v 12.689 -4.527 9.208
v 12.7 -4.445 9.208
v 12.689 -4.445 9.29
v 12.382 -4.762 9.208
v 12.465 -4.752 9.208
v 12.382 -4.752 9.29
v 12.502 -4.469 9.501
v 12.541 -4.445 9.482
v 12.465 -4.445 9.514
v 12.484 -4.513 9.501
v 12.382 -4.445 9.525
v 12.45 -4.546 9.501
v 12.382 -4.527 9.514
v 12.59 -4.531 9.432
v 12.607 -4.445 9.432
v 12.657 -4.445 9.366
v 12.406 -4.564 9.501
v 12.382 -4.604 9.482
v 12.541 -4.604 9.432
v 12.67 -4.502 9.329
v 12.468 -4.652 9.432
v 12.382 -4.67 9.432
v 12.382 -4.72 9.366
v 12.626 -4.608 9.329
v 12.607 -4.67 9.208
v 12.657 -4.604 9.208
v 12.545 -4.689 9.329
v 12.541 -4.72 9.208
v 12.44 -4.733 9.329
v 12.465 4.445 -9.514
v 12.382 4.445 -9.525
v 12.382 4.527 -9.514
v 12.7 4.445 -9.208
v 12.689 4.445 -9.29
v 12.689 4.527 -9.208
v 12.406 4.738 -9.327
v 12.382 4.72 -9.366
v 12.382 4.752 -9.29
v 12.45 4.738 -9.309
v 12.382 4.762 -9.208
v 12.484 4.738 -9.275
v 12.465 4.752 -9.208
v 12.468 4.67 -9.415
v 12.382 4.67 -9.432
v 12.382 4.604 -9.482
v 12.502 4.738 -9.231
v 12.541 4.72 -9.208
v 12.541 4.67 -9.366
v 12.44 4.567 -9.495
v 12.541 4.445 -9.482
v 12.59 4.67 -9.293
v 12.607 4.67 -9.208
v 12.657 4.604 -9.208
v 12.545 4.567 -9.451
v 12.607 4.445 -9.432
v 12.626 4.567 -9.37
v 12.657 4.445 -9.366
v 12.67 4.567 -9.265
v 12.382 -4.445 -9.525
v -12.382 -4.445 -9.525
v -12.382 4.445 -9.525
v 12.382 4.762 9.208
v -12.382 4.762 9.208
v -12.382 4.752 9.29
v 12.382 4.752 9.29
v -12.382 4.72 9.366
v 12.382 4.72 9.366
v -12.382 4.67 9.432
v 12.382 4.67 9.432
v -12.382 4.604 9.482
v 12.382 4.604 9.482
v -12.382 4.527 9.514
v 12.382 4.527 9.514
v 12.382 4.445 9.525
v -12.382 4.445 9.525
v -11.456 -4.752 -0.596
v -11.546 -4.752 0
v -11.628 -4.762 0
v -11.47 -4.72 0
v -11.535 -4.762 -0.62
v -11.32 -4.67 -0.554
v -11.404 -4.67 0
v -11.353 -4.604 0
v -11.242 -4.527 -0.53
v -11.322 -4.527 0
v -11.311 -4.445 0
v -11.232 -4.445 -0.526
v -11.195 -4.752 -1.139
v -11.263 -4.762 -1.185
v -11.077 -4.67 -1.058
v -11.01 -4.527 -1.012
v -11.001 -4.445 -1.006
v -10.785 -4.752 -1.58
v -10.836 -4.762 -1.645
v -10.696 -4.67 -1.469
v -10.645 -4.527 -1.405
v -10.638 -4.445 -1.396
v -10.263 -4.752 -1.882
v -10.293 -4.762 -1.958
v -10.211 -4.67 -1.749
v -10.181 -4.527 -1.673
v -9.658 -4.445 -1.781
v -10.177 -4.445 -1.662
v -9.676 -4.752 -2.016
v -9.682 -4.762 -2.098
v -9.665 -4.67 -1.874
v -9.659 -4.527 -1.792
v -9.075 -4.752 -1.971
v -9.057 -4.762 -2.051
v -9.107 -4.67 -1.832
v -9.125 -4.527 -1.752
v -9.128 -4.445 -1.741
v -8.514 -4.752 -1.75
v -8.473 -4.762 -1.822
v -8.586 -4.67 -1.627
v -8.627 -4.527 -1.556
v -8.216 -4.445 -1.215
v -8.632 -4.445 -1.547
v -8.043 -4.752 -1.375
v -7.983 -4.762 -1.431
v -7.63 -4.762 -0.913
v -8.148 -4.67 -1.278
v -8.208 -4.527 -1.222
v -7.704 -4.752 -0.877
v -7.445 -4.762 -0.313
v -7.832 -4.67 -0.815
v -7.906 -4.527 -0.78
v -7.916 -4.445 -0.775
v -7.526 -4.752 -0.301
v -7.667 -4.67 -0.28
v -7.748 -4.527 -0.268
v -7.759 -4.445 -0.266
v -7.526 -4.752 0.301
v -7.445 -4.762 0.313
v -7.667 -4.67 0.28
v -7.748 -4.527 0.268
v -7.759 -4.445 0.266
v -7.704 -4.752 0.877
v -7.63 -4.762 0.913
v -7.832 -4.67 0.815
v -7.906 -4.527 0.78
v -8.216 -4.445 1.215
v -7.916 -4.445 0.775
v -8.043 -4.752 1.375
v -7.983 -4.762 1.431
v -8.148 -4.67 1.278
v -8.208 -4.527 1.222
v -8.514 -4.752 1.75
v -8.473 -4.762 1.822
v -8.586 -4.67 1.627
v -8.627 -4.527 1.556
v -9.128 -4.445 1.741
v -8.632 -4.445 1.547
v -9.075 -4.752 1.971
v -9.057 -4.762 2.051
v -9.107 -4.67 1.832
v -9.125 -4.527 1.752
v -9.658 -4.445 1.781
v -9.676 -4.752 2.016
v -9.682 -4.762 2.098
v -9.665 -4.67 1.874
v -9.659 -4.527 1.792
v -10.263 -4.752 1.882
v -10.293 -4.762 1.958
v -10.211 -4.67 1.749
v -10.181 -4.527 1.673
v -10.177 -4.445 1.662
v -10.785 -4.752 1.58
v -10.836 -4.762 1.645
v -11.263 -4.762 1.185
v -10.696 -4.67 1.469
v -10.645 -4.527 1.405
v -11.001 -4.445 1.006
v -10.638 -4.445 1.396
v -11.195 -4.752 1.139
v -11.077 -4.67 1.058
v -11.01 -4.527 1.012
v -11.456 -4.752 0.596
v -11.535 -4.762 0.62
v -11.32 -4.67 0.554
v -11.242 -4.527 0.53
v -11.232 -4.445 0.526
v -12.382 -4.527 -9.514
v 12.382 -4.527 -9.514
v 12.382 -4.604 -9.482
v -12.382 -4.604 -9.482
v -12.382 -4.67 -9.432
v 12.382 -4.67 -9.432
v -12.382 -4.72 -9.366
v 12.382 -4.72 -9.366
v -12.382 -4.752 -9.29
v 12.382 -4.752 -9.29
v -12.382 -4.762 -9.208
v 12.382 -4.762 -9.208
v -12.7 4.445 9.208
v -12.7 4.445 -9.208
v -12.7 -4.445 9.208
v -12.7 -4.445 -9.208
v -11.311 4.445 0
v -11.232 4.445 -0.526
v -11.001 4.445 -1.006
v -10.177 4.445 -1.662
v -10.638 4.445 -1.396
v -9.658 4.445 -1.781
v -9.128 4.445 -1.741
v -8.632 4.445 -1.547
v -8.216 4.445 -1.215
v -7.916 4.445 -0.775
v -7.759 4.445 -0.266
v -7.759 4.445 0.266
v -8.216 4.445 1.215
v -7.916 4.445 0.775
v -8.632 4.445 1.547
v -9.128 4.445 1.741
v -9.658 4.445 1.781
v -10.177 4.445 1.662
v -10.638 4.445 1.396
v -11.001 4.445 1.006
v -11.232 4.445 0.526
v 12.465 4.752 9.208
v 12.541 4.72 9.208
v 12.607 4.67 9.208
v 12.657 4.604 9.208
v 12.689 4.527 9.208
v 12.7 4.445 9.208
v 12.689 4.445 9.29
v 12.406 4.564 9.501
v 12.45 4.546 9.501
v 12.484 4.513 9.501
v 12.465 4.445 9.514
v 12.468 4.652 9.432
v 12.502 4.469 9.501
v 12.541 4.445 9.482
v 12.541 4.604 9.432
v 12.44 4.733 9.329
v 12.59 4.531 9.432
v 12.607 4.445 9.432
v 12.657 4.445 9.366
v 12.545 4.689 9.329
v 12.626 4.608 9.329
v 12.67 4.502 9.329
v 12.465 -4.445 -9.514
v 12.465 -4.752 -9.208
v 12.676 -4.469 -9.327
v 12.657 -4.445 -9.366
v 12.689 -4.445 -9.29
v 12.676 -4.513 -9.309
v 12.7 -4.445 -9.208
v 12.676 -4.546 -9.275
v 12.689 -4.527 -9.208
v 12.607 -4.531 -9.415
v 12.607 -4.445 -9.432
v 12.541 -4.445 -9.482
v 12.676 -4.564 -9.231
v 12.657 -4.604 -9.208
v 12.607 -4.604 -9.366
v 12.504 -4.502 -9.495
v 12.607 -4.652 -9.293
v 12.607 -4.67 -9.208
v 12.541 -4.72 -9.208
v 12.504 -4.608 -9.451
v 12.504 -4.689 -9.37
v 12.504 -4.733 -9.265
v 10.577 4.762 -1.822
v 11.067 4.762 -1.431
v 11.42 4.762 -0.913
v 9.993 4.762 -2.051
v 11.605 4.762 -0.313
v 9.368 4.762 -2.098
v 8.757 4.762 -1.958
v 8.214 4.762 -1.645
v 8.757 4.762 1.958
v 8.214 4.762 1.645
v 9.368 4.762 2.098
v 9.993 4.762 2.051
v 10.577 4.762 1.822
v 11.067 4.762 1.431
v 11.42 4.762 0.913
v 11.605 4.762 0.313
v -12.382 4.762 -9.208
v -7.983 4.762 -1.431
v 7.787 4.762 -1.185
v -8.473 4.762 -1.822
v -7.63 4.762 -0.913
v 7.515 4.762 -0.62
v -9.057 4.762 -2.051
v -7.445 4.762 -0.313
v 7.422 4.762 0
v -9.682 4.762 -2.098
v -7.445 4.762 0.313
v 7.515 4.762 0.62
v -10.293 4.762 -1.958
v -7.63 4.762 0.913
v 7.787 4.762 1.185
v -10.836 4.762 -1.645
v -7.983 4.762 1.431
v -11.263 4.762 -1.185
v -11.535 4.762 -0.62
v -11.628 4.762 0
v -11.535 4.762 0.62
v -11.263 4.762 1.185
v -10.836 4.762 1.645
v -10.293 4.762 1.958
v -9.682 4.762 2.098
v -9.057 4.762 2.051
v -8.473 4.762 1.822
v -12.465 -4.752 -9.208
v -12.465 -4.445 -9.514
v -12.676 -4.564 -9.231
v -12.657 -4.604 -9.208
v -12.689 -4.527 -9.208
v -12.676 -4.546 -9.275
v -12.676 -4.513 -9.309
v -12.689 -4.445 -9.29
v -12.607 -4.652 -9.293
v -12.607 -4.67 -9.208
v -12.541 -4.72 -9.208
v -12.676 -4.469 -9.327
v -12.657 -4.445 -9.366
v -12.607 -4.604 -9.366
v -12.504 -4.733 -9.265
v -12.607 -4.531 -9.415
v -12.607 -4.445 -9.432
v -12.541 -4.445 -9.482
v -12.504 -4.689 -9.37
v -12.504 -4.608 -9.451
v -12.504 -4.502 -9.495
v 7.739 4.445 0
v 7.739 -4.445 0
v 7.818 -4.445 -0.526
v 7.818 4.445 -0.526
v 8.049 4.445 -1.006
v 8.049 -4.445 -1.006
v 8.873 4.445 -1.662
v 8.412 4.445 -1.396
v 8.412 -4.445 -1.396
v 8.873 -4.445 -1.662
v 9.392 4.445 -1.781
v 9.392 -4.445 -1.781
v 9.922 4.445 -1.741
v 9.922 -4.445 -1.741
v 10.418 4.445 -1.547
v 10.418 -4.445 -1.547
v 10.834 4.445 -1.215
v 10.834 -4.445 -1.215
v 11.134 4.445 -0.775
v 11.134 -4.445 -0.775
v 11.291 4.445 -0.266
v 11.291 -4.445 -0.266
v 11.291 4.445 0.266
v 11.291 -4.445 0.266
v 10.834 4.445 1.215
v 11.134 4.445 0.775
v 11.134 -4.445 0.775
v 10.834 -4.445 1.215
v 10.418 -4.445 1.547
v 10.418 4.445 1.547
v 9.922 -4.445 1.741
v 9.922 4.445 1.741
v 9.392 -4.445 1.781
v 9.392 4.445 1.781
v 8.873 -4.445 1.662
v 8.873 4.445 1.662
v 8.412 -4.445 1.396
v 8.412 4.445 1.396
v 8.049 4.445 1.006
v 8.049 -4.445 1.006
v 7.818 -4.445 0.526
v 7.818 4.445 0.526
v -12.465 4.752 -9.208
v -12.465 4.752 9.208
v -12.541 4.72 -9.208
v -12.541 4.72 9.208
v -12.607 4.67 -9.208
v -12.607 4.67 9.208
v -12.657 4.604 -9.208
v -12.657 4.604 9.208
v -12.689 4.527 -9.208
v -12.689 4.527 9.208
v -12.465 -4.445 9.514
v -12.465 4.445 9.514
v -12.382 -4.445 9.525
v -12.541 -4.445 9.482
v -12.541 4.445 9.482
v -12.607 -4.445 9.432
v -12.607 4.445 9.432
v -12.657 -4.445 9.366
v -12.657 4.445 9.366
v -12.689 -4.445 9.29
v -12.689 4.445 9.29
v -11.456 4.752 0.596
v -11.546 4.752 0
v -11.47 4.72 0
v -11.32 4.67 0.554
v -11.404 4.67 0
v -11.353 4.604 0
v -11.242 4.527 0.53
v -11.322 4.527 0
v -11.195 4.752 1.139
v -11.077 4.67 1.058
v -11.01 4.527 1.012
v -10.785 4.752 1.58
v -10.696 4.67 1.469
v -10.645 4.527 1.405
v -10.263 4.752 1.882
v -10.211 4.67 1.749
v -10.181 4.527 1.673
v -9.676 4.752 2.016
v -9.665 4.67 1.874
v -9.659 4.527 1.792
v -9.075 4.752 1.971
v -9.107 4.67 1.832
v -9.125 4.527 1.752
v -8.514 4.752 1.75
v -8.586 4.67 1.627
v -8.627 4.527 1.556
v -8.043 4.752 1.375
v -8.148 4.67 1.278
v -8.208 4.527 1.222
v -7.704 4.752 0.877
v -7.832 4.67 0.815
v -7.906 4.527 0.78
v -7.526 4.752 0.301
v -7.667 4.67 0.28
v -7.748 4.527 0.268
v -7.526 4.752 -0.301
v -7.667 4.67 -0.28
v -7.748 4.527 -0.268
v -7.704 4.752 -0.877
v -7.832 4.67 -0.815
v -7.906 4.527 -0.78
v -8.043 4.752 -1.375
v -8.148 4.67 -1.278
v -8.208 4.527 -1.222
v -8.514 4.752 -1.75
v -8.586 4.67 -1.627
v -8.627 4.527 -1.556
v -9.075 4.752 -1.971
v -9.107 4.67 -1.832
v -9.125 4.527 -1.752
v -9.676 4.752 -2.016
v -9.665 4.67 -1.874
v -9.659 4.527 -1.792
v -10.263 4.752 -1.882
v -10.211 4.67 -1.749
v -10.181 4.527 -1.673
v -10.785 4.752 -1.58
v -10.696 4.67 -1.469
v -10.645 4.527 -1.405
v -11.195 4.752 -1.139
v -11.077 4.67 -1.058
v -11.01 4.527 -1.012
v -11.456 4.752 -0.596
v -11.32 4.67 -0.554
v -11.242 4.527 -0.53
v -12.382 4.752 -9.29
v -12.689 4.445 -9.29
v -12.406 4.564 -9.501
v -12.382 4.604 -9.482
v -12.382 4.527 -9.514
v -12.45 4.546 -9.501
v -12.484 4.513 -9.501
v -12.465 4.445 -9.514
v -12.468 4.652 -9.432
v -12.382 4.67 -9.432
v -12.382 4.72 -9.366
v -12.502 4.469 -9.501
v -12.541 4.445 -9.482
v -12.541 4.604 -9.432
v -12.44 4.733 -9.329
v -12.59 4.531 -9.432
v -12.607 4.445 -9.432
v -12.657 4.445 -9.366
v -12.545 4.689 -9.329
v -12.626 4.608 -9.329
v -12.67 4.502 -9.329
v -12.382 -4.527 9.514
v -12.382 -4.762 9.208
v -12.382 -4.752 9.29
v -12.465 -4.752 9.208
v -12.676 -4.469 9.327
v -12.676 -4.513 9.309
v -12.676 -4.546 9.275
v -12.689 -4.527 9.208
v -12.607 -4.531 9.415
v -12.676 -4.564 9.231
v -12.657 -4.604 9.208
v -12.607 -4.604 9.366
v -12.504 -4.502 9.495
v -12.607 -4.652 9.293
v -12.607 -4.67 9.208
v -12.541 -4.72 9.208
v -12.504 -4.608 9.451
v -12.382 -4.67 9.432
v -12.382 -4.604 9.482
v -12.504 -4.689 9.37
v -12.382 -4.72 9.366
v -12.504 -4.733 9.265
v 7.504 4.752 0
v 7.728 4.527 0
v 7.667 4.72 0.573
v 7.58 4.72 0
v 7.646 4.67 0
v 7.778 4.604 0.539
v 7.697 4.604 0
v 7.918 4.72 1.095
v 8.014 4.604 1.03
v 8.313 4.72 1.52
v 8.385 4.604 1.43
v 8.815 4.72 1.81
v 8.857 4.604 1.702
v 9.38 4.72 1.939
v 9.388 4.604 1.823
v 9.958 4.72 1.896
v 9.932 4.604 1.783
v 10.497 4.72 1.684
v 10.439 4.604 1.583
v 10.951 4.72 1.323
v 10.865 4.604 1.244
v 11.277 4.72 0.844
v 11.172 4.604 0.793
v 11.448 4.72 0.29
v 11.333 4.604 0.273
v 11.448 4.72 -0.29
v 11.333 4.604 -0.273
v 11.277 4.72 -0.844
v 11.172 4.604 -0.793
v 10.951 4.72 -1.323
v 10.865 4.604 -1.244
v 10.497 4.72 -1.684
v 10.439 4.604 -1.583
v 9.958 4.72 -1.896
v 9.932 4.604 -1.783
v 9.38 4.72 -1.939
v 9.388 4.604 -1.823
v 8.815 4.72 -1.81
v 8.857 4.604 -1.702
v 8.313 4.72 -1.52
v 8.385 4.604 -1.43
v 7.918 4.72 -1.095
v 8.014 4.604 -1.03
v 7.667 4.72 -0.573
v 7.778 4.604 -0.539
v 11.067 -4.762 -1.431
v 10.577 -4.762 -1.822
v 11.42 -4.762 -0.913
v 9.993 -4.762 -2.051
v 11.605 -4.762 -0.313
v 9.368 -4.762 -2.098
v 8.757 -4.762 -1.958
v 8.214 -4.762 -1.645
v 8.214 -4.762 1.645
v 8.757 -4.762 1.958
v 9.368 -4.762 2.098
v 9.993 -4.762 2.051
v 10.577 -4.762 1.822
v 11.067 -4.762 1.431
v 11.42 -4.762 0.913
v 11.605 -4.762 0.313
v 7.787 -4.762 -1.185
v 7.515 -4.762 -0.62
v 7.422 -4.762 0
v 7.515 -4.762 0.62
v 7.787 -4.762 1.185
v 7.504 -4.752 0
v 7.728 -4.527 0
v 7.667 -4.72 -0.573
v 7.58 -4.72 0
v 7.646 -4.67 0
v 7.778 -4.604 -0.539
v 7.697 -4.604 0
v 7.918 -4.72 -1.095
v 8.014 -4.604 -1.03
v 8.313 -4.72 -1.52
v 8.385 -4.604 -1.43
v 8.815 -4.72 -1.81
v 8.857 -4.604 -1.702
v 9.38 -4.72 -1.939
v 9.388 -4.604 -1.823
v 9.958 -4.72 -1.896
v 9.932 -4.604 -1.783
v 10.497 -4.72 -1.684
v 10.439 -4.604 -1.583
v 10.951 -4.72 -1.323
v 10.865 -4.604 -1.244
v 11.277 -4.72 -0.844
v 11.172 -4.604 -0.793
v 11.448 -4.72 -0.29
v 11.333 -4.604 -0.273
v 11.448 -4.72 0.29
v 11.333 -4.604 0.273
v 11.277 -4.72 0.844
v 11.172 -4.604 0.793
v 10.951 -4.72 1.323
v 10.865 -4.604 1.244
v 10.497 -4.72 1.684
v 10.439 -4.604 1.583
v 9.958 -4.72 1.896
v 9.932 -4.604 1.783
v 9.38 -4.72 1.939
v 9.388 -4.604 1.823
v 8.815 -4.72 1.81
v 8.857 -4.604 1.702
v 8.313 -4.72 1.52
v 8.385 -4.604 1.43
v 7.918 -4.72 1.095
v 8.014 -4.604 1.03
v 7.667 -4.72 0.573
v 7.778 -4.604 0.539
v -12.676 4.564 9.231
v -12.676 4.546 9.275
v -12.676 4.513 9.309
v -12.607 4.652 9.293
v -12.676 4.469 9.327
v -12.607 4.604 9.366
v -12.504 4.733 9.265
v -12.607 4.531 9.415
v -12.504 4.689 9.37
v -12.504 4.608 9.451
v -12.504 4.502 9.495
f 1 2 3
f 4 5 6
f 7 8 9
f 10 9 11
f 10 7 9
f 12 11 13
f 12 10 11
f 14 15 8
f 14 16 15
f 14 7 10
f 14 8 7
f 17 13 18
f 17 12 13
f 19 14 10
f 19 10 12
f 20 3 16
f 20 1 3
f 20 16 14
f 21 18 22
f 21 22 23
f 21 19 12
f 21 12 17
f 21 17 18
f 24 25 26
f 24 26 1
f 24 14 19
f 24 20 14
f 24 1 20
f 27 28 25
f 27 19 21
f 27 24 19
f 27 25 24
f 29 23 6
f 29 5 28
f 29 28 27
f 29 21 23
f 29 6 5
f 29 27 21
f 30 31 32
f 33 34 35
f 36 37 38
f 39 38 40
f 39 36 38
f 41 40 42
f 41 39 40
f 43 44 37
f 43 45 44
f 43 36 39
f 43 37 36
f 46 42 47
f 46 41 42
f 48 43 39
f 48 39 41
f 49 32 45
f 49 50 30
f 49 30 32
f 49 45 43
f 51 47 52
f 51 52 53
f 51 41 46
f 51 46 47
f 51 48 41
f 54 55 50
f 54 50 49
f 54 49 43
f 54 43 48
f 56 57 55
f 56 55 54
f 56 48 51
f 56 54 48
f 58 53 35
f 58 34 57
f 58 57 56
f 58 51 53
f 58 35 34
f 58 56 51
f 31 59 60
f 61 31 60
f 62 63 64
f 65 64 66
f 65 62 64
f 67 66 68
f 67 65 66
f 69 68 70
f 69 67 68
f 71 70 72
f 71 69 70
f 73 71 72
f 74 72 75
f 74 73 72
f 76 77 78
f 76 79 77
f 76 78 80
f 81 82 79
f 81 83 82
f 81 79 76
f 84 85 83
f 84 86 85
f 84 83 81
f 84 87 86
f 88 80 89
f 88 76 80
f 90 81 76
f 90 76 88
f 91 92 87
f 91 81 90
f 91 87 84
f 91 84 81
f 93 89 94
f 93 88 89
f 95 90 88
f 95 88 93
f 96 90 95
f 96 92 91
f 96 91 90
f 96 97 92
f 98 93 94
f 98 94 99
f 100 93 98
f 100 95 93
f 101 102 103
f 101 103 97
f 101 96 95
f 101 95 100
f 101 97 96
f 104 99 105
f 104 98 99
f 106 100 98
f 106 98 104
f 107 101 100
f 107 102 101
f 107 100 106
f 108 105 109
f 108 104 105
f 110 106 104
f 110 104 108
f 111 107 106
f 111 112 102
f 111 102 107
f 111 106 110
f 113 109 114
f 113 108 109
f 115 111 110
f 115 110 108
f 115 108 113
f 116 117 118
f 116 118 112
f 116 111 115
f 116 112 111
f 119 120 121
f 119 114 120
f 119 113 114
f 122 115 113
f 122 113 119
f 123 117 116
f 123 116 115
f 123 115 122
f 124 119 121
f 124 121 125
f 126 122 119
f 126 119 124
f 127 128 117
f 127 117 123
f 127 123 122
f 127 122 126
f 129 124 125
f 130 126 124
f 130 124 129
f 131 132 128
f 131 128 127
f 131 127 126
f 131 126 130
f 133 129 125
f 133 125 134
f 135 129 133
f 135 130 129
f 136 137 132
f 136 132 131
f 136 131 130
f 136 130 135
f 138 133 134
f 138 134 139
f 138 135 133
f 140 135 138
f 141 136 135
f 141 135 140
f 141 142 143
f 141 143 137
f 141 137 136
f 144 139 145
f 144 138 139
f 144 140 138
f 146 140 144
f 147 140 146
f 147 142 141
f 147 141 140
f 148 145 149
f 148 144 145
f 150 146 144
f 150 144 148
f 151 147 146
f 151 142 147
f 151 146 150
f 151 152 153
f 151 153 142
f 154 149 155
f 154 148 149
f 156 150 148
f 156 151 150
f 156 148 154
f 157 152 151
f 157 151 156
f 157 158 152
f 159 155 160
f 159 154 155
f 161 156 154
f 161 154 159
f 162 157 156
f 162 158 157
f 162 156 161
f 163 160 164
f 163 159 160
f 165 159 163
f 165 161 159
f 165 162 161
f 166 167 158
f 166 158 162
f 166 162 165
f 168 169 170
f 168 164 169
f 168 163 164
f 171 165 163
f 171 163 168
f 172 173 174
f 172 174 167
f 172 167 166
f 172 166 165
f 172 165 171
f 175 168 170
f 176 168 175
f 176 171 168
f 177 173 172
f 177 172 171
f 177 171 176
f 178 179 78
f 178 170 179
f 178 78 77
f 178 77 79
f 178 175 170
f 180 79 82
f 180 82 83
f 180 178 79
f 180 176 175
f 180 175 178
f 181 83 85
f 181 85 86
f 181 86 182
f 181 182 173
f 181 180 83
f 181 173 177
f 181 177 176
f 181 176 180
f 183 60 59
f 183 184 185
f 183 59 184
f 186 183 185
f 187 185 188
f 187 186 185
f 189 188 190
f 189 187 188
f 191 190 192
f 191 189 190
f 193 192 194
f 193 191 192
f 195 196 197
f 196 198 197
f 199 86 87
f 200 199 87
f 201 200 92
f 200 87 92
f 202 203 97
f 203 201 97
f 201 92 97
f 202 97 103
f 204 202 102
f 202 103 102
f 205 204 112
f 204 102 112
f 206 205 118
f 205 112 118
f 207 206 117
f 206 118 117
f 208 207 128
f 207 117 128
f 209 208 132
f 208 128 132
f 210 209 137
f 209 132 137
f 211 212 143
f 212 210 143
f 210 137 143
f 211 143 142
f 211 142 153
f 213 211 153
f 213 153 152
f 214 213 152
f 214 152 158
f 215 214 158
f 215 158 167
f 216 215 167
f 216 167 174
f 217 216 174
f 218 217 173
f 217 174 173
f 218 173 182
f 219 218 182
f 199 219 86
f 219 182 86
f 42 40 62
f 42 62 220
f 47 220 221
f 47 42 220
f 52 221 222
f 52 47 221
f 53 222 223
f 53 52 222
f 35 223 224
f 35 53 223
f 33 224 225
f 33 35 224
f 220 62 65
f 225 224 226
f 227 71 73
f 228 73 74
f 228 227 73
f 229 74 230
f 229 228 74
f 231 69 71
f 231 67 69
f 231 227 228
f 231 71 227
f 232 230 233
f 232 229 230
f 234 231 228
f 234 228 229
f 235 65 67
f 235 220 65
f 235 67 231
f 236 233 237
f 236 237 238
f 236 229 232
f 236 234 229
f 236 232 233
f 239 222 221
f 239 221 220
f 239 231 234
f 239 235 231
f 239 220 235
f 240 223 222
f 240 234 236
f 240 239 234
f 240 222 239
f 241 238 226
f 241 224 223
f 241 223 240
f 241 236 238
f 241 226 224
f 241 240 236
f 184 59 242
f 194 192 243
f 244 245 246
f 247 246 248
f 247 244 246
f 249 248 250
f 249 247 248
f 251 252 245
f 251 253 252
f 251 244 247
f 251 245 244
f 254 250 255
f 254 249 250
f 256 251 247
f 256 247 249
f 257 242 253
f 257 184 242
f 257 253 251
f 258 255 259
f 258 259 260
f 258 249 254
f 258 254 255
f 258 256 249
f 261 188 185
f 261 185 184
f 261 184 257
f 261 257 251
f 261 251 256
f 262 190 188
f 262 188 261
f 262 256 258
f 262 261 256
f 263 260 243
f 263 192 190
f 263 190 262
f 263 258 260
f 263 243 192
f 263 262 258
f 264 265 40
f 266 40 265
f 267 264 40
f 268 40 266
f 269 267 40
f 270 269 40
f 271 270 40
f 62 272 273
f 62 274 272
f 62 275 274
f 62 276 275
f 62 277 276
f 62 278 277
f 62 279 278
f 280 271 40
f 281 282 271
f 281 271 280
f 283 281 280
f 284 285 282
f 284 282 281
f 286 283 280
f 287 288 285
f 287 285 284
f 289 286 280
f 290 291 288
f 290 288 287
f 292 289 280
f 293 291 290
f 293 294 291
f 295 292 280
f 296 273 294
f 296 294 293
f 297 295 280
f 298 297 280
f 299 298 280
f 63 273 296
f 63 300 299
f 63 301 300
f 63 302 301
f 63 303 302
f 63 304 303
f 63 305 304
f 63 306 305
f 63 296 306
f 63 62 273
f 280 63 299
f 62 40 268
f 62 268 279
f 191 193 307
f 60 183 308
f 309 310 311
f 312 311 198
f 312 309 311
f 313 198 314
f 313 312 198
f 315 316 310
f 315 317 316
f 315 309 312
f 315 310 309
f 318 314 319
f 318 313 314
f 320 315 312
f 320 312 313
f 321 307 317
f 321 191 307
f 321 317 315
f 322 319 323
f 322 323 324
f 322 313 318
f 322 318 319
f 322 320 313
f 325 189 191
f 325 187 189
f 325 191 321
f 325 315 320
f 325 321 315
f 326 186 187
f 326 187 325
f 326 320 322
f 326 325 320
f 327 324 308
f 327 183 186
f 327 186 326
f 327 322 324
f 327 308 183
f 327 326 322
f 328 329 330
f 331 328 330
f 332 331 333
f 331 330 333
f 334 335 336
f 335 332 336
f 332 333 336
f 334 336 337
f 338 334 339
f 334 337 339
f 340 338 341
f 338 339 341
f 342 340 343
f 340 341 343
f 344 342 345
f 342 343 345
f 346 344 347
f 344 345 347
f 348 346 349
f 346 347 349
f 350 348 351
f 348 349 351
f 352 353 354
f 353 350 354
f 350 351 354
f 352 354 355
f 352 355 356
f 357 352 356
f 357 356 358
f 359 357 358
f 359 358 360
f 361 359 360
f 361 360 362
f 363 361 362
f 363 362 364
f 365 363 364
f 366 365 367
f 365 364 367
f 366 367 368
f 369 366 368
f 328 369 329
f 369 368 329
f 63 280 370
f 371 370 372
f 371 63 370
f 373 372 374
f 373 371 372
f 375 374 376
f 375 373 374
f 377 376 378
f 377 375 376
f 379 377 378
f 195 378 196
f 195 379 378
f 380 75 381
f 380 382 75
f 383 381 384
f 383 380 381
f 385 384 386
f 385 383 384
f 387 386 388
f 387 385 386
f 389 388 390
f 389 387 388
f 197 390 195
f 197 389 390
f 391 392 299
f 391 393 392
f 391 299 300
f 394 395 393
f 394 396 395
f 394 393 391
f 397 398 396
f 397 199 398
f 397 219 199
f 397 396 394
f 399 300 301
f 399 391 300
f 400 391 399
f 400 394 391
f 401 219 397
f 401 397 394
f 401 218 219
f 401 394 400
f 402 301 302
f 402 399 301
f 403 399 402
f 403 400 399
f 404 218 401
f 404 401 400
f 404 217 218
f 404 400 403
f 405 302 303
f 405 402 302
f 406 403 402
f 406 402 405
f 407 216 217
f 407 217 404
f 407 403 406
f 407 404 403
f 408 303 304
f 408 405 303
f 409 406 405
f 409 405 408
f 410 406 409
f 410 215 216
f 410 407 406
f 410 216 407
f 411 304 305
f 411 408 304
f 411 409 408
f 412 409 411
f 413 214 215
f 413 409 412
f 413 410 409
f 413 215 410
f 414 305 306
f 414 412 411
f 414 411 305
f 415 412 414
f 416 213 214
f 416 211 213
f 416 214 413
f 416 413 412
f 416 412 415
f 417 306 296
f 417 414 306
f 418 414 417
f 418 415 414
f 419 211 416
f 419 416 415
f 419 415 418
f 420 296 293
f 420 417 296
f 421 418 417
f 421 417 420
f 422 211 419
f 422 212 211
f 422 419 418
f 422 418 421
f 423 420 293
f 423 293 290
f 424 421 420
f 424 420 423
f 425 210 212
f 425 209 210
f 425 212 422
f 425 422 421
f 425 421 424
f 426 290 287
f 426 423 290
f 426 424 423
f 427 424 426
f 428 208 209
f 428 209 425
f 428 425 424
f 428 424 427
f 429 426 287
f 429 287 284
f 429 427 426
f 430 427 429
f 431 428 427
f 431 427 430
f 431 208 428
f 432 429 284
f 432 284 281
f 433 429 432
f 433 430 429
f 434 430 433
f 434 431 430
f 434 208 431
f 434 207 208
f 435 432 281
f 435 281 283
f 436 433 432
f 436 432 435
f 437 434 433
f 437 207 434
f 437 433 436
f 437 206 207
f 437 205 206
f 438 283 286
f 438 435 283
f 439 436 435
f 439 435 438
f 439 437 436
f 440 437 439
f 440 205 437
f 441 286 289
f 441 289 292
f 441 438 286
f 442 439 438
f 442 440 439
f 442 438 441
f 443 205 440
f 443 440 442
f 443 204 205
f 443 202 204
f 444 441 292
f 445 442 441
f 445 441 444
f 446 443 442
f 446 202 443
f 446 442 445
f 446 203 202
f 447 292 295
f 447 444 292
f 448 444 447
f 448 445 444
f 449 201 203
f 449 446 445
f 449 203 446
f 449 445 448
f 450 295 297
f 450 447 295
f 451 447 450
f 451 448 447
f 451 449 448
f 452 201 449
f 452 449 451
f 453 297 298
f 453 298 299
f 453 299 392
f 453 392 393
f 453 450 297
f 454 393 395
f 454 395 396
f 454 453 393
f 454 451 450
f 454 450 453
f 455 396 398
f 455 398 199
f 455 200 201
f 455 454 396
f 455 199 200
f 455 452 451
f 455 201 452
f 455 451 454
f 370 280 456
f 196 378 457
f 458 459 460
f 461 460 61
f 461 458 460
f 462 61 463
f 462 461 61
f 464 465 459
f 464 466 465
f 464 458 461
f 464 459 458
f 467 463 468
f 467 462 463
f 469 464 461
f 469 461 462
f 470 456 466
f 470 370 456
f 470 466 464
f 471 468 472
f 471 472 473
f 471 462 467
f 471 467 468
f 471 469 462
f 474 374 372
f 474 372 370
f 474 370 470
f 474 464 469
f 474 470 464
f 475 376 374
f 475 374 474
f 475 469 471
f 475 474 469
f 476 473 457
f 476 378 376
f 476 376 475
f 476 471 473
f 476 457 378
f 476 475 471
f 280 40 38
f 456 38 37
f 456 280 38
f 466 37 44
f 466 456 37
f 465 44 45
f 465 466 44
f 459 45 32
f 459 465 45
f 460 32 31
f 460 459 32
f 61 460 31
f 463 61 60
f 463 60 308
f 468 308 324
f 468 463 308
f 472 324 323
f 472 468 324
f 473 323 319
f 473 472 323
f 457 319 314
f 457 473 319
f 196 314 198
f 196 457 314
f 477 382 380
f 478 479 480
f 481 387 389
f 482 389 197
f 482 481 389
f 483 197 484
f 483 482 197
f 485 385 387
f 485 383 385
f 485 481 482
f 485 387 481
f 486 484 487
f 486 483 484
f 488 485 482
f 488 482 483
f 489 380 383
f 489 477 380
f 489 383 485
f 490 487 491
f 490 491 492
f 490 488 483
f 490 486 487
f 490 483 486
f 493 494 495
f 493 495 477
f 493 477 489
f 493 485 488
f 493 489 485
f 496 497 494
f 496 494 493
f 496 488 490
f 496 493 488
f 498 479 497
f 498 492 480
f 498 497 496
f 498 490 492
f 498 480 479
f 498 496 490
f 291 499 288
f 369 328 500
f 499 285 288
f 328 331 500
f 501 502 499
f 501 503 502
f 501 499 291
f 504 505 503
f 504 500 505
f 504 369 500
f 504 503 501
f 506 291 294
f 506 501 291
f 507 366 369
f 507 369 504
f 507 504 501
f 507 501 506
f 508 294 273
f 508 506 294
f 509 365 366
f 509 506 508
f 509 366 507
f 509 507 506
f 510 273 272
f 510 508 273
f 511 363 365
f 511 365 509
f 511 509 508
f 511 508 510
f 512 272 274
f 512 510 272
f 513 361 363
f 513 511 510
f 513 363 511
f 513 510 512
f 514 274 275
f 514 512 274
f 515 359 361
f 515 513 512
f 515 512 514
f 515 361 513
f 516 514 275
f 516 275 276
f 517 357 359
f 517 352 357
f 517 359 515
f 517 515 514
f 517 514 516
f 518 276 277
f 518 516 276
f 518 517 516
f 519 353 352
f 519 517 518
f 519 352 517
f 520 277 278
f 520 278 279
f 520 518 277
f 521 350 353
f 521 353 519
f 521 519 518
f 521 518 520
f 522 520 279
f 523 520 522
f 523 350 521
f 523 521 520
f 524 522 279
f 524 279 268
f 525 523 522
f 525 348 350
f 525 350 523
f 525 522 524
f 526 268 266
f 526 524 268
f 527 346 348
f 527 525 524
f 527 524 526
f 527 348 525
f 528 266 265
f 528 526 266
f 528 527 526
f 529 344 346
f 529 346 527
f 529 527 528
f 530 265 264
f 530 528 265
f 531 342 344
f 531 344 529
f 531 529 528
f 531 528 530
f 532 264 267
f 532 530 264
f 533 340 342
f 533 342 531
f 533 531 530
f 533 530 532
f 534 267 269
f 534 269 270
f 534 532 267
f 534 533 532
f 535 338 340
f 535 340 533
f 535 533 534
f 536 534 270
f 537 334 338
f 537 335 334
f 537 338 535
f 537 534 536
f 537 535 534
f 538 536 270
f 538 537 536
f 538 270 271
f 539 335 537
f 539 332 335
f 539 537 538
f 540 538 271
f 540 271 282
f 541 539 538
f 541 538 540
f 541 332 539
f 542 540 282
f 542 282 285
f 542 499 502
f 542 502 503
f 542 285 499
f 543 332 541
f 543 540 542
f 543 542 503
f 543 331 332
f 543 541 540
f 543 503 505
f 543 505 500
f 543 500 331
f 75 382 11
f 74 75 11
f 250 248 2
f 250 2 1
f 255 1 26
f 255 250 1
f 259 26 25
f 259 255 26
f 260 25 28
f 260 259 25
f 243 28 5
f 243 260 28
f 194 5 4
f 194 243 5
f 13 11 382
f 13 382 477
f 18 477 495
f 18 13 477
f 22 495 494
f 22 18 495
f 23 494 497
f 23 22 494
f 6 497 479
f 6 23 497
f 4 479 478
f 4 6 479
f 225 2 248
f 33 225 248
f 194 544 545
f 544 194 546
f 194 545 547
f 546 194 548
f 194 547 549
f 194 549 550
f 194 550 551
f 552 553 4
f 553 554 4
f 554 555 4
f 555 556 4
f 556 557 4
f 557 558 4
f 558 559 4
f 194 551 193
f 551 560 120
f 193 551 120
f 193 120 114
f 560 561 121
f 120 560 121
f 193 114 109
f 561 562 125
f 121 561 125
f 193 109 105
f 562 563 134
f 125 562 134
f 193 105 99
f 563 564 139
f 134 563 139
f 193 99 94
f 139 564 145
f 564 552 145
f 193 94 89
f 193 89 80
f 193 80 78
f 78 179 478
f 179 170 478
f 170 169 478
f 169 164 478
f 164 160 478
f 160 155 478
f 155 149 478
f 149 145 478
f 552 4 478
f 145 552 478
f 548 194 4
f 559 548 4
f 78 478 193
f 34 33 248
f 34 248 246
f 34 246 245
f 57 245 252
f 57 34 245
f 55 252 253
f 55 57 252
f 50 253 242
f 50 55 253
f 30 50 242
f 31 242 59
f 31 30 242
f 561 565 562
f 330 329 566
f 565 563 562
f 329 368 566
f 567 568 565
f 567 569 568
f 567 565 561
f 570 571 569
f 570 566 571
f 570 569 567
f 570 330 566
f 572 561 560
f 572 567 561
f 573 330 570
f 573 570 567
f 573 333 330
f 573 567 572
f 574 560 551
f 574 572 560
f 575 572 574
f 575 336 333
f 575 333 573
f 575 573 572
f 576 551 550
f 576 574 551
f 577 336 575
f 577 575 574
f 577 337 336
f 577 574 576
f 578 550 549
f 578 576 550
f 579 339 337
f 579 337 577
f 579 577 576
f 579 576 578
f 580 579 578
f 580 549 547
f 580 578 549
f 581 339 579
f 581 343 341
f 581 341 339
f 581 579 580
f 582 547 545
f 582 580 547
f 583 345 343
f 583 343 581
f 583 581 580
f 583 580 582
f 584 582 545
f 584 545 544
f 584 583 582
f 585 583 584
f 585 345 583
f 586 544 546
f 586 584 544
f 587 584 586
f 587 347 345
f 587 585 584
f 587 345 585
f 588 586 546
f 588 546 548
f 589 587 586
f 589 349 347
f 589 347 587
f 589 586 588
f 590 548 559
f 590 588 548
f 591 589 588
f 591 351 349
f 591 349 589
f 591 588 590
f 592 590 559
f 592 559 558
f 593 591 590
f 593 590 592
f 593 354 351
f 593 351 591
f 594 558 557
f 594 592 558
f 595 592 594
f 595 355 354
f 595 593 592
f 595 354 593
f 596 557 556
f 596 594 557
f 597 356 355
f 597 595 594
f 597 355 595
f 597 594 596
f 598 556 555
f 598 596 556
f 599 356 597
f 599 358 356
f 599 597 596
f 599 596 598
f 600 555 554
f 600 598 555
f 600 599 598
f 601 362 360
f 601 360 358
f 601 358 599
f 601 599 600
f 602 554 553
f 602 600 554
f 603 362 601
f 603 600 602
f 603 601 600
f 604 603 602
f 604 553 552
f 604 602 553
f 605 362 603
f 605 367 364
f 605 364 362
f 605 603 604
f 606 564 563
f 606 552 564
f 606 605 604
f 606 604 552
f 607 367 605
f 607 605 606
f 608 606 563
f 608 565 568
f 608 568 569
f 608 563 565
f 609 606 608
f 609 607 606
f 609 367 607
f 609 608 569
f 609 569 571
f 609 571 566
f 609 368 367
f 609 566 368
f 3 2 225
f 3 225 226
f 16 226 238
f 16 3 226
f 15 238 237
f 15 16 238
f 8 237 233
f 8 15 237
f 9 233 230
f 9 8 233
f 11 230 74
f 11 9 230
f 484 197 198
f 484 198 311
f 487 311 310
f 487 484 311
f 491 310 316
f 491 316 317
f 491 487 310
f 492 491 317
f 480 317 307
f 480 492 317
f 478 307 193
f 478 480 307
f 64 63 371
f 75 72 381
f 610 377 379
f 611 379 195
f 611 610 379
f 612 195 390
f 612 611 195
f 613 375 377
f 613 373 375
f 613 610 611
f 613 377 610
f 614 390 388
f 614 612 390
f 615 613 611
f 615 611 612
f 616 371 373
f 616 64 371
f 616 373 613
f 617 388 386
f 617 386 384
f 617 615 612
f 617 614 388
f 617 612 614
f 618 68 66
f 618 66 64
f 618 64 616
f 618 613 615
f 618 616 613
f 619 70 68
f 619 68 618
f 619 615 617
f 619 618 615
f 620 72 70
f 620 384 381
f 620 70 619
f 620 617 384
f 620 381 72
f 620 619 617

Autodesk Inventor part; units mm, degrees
ref_plane "YZ Plane" through (0, 0, 0) normal (1, 0, 0) x (0, 1, 0)
ref_plane "XZ Plane" through (0, 0, 0) normal (0, 1, 0) x (-1, 0, 0)
ref_plane "XY Plane" through (0, 0, 0) normal (0, 0, 1) x (1, 0, 0)
sketch "Sketch1" plane through (0, 0, 0) normal (0, 1, 0) x (-1, 0, 0)
  line L0 (-12.7, -9.525) -> (12.7, -9.525)
  line L1 (12.7, -9.525) -> (12.7, 9.525)
  line L2 (12.7, 9.525) -> (-12.7, 9.525)
  line L3 (-12.7, 9.525) -> (-12.7, -9.525)
  line L4 (-12.7, -9.525) -> (12.7, 9.525) construction
  line L5 (12.7, -9.525) -> (-12.7, 9.525) construction
  circle A0 centre (9.525, 0) radius 1.7859
  circle A1 centre (-9.525, 0) radius 1.7859
  point P0 (0, 0)
  dimension "d0" = 25.4
  dimension "d1" = 19.05
  dimension "d2" = 3.5719
  dimension "d3" = 3.5719
  dimension "d4" = 19.05
  dimension "d5" = 3.175
  dimension "d6" = 3.175
  dimension "d7" = 5.715
extrude "Extrusion1" add sketch "Sketch1" along normal mid plane 9.525
fillet "Fillet1" radius 0.3175 16 edges at (11.3109, -4.7625, 0) (11.3109, 4.7625, 0) (-7.7391, -4.7625, 0) (-7.7391, 4.7625, 0) (0, -4.7625, -9.525) (12.7, -4.7625, 0) (0, -4.7625, 9.525) (-12.7, -4.7625, 0) (12.7, 0, -9.525) (12.7, 4.7625, 0) (12.7, 0, 9.525) (0, 4.7625, 9.525) (-12.7, 0, 9.525) (-12.7, 4.7625, 0) (-12.7, 0, -9.525) (0, 4.7625, -9.525)
properties part number "enginefoot" material "Steel, Carbon"
